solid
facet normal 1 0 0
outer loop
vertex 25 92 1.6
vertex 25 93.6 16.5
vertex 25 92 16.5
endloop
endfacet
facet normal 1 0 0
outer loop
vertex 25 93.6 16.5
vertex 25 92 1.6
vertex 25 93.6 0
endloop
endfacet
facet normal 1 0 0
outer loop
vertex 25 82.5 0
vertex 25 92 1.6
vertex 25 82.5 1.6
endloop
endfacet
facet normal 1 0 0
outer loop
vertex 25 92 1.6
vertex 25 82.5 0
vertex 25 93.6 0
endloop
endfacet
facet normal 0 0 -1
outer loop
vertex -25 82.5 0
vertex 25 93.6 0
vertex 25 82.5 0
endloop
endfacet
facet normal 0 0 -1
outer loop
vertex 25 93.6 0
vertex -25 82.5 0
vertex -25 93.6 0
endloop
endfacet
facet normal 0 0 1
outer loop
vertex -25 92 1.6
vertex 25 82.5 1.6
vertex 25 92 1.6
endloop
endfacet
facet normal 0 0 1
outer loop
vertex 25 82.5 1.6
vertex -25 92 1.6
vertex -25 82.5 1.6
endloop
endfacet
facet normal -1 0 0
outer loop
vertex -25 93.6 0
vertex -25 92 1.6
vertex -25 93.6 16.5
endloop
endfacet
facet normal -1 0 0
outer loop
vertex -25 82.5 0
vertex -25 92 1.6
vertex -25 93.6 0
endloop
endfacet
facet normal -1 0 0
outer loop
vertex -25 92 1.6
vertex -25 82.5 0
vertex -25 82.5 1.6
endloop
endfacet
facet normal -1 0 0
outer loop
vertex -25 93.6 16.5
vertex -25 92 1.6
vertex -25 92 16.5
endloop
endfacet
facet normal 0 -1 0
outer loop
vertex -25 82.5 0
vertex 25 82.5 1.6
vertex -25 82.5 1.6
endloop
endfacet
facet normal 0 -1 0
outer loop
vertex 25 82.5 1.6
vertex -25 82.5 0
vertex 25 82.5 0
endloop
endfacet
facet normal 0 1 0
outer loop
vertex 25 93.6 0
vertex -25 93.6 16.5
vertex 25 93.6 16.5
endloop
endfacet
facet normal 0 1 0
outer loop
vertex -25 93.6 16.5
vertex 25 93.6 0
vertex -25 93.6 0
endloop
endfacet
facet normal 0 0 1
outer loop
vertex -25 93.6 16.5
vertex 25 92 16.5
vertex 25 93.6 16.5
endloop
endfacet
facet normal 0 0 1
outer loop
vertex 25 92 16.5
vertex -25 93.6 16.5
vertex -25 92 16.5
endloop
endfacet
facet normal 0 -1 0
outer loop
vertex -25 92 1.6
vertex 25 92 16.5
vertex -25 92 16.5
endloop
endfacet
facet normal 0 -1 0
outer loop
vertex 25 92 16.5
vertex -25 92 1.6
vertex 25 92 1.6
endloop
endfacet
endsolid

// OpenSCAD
// Splice plate for the two-half Surface Go window frame: an L angle glued across
// the seam, over the back rim and down the outside of the wall.
// Landscape: print 1 (bottom wall). Portrait: print 2 (both long walls).
// Print as exported (rim leg on the bed), no supports.
// Dimensions come from surface-go-window-frame.scad.
use <surface-go-window-frame.scad>

splice_print();
